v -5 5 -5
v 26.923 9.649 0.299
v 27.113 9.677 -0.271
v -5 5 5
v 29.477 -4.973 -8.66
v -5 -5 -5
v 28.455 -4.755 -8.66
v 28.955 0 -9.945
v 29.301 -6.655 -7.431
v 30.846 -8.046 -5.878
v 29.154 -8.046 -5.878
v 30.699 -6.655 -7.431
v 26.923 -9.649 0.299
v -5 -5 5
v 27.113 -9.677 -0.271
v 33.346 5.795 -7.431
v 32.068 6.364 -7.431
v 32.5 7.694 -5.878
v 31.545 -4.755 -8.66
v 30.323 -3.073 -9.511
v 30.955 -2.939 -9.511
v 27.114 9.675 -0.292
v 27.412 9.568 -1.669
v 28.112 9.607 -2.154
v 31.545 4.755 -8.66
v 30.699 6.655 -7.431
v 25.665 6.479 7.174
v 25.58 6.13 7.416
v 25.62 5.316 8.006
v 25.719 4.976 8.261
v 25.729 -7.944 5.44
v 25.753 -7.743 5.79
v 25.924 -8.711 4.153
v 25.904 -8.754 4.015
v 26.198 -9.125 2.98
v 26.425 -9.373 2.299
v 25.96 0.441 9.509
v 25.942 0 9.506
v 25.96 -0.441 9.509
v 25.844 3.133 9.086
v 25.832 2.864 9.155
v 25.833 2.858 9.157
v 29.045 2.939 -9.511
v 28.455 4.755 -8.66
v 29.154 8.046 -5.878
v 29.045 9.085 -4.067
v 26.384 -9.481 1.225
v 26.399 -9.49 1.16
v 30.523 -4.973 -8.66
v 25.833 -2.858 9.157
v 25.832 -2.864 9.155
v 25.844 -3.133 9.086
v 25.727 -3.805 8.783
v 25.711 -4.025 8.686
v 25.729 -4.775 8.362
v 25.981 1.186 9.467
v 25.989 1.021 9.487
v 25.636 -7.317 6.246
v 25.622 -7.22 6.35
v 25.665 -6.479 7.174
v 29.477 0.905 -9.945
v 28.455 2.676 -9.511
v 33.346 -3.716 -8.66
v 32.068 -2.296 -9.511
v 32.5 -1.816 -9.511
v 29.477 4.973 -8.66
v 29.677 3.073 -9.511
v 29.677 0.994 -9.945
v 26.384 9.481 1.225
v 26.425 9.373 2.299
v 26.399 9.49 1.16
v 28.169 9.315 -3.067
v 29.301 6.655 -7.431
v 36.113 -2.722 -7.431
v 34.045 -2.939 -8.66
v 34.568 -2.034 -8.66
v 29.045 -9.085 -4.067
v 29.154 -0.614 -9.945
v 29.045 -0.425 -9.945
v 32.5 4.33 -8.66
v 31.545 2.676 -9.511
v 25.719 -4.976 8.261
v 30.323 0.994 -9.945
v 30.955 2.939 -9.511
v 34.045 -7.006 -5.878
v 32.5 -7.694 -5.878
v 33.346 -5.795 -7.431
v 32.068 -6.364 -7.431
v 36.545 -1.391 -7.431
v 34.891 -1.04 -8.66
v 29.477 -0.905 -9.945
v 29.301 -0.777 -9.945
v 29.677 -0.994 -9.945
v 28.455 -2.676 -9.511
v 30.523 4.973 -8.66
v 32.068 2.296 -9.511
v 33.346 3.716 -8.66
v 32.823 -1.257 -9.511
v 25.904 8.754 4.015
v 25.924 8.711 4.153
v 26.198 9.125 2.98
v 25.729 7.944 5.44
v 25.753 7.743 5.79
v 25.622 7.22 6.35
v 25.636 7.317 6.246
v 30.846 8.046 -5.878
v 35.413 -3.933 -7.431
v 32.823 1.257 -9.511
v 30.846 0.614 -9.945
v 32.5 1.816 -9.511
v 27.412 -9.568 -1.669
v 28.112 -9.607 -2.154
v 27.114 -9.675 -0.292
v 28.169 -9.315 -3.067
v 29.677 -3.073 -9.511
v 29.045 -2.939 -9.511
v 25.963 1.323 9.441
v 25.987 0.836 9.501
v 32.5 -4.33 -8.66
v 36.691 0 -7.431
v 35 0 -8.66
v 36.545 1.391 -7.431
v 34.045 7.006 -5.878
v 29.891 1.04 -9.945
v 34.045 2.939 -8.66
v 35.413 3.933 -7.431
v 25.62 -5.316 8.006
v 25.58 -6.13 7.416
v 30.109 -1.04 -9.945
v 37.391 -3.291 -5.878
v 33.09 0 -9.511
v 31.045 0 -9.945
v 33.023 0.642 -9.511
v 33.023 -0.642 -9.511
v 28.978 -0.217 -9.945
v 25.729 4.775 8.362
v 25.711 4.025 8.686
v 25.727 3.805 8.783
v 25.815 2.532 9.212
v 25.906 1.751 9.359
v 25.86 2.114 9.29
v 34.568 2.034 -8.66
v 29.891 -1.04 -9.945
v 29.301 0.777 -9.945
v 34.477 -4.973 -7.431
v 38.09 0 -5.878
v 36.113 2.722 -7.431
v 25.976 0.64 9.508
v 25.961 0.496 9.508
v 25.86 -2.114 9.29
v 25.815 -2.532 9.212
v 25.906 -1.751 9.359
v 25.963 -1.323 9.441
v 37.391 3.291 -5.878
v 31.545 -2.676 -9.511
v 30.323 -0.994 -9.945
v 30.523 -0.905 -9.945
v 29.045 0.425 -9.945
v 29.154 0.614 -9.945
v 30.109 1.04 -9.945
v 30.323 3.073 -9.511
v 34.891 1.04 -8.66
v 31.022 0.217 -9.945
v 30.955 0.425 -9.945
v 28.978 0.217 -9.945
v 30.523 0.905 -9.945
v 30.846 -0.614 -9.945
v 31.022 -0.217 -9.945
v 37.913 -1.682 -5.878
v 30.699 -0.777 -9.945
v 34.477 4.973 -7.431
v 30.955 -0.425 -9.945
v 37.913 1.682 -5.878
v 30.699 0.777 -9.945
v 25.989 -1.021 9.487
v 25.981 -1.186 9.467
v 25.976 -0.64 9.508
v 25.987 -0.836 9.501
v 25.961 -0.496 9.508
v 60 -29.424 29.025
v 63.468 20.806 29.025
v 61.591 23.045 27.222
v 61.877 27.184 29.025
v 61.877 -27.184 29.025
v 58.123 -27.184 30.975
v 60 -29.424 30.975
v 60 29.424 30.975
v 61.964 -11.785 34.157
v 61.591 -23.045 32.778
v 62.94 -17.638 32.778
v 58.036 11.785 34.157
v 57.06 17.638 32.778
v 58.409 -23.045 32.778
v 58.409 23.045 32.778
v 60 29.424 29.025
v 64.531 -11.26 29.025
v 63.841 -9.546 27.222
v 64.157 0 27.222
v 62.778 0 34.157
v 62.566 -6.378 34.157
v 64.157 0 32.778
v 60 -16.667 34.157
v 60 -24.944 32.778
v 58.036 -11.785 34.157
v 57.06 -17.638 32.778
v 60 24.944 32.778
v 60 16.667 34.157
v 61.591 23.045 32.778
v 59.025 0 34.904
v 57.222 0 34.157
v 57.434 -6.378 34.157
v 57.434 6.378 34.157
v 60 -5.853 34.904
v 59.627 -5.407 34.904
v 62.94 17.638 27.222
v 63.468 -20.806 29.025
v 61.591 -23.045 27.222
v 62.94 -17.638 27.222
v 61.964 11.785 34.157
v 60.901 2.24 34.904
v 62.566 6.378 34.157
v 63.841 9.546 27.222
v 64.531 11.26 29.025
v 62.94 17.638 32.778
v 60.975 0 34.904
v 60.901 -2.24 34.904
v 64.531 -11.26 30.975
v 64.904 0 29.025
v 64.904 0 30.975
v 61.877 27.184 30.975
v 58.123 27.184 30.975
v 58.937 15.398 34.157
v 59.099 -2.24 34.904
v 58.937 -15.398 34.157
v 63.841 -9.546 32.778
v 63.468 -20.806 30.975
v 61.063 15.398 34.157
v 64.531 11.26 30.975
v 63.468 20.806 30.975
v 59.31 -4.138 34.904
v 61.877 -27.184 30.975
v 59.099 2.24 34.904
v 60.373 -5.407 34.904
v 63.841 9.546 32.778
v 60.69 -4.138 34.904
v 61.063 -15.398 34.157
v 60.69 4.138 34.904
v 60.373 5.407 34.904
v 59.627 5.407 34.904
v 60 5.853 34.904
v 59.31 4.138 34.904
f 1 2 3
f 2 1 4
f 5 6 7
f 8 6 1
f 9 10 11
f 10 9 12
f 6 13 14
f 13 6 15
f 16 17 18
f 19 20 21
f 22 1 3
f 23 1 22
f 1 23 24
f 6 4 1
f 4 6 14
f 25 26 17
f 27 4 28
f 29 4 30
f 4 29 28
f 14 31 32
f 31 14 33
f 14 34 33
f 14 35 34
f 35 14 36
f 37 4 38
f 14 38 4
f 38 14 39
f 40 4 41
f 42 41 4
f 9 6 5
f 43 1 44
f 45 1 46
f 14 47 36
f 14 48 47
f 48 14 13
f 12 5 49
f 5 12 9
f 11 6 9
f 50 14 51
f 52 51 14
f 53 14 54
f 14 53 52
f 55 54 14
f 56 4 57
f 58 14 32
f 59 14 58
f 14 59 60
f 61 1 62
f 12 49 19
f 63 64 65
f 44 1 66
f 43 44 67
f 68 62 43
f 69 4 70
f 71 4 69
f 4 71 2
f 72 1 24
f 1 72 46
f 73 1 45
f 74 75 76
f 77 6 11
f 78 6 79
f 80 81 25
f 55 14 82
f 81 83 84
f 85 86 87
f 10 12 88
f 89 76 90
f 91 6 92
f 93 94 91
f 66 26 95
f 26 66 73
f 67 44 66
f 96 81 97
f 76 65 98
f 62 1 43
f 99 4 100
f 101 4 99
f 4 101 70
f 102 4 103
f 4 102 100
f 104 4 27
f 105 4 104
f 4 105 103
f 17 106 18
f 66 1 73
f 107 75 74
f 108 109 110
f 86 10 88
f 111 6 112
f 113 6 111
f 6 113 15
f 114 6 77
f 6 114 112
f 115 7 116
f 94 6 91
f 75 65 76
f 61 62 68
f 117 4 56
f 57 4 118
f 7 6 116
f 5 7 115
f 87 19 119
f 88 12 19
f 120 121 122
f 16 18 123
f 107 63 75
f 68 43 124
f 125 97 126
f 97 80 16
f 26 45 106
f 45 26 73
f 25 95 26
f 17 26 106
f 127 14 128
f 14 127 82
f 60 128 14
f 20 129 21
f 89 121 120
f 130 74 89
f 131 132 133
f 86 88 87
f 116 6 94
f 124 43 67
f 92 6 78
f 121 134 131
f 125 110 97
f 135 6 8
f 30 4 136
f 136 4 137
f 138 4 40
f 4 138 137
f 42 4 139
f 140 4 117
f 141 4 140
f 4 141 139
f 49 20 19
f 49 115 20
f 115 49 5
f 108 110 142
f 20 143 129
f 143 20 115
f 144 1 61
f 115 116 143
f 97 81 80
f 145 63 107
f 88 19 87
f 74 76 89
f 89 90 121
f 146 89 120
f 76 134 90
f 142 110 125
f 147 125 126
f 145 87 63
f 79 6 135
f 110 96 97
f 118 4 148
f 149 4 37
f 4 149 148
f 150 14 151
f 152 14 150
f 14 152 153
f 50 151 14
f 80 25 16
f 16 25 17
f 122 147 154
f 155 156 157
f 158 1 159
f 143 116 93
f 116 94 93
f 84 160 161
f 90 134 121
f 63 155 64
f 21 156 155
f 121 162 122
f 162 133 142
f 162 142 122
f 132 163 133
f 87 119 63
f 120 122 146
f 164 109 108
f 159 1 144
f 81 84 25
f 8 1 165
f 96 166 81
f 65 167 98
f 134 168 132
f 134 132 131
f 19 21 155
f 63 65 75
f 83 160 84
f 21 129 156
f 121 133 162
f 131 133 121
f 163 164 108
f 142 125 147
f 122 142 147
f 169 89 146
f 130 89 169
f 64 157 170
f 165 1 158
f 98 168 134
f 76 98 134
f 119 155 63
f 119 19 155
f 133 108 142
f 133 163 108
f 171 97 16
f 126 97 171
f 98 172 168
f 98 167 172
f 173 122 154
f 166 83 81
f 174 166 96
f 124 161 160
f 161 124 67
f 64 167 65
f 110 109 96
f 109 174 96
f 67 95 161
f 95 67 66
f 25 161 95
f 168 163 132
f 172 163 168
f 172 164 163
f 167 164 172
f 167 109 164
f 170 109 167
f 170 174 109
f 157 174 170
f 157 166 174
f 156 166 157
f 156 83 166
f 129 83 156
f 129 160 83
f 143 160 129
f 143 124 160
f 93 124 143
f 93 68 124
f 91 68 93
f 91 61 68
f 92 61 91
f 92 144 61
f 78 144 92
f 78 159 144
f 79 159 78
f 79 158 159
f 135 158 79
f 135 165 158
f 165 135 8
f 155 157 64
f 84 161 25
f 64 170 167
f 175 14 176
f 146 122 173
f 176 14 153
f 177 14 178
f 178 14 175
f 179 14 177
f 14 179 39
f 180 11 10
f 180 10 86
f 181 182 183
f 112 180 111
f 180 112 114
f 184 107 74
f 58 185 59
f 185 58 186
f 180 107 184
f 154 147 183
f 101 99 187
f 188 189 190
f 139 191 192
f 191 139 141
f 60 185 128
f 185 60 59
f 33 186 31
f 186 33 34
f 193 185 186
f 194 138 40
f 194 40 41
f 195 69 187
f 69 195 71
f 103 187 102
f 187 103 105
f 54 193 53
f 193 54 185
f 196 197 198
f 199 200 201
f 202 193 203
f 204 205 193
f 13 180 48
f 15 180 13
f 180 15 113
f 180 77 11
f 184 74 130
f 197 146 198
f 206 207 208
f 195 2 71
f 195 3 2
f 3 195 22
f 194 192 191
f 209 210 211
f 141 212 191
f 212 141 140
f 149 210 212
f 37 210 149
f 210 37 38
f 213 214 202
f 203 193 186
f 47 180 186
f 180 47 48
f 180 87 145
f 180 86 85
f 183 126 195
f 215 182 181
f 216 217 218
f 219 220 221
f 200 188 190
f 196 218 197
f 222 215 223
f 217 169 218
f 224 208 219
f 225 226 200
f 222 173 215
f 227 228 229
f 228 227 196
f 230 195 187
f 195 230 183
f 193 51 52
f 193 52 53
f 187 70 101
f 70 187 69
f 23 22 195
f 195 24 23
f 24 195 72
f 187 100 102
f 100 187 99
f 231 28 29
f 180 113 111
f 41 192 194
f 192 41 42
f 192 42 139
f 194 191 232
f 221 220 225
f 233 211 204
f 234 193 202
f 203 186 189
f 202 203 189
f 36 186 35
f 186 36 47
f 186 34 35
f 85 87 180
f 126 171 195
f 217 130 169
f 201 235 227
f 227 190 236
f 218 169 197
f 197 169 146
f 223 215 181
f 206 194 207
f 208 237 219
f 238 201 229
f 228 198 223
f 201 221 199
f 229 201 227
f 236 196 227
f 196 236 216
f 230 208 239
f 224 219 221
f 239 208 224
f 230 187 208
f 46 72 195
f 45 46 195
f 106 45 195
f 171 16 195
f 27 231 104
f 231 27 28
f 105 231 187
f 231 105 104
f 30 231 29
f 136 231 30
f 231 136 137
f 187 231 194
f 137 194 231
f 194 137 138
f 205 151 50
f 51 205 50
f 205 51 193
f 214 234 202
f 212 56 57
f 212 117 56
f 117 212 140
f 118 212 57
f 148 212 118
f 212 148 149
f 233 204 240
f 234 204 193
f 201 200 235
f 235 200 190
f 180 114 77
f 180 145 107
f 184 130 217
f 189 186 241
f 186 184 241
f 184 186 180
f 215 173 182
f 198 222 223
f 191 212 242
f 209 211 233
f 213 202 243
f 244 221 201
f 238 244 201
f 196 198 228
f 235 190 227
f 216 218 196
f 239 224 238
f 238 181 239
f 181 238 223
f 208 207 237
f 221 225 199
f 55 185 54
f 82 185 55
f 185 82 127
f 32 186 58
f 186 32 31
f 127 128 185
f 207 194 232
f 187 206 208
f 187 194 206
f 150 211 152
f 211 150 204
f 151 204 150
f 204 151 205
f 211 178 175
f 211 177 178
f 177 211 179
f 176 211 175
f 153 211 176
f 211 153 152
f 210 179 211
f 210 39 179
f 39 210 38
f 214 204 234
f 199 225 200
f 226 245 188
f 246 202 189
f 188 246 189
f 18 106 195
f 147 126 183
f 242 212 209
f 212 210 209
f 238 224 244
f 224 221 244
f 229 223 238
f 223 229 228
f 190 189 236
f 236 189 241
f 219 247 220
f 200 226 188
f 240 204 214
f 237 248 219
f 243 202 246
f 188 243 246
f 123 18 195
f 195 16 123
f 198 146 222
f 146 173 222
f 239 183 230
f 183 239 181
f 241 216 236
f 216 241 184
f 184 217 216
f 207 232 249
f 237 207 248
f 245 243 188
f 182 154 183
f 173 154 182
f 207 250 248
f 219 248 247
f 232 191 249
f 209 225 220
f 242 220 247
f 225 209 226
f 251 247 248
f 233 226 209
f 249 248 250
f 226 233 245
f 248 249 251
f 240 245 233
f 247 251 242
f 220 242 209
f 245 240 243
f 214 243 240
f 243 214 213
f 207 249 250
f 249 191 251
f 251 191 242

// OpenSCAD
module sequental_hull()
{
    union()
    {
        for (i=[0:$children-2])
        {
            hull()
            {
                children(i);
                children(i+1);
            }
        }
    }
}

module hullout(dim)
{
	for (i=[0:$children-1] ) 
	{
		hull()
		{
			children(i);
			translate (dim)
				children(i);
		}
	}
}

module test()
{
    sequental_hull()
    {
        cube ([10,10,10],true);
        translate ([30,0,0])
            sphere (10);
        translate ([60,0,30])
        scale ([1,6,1])
            sphere (5);
    }
}

test();
